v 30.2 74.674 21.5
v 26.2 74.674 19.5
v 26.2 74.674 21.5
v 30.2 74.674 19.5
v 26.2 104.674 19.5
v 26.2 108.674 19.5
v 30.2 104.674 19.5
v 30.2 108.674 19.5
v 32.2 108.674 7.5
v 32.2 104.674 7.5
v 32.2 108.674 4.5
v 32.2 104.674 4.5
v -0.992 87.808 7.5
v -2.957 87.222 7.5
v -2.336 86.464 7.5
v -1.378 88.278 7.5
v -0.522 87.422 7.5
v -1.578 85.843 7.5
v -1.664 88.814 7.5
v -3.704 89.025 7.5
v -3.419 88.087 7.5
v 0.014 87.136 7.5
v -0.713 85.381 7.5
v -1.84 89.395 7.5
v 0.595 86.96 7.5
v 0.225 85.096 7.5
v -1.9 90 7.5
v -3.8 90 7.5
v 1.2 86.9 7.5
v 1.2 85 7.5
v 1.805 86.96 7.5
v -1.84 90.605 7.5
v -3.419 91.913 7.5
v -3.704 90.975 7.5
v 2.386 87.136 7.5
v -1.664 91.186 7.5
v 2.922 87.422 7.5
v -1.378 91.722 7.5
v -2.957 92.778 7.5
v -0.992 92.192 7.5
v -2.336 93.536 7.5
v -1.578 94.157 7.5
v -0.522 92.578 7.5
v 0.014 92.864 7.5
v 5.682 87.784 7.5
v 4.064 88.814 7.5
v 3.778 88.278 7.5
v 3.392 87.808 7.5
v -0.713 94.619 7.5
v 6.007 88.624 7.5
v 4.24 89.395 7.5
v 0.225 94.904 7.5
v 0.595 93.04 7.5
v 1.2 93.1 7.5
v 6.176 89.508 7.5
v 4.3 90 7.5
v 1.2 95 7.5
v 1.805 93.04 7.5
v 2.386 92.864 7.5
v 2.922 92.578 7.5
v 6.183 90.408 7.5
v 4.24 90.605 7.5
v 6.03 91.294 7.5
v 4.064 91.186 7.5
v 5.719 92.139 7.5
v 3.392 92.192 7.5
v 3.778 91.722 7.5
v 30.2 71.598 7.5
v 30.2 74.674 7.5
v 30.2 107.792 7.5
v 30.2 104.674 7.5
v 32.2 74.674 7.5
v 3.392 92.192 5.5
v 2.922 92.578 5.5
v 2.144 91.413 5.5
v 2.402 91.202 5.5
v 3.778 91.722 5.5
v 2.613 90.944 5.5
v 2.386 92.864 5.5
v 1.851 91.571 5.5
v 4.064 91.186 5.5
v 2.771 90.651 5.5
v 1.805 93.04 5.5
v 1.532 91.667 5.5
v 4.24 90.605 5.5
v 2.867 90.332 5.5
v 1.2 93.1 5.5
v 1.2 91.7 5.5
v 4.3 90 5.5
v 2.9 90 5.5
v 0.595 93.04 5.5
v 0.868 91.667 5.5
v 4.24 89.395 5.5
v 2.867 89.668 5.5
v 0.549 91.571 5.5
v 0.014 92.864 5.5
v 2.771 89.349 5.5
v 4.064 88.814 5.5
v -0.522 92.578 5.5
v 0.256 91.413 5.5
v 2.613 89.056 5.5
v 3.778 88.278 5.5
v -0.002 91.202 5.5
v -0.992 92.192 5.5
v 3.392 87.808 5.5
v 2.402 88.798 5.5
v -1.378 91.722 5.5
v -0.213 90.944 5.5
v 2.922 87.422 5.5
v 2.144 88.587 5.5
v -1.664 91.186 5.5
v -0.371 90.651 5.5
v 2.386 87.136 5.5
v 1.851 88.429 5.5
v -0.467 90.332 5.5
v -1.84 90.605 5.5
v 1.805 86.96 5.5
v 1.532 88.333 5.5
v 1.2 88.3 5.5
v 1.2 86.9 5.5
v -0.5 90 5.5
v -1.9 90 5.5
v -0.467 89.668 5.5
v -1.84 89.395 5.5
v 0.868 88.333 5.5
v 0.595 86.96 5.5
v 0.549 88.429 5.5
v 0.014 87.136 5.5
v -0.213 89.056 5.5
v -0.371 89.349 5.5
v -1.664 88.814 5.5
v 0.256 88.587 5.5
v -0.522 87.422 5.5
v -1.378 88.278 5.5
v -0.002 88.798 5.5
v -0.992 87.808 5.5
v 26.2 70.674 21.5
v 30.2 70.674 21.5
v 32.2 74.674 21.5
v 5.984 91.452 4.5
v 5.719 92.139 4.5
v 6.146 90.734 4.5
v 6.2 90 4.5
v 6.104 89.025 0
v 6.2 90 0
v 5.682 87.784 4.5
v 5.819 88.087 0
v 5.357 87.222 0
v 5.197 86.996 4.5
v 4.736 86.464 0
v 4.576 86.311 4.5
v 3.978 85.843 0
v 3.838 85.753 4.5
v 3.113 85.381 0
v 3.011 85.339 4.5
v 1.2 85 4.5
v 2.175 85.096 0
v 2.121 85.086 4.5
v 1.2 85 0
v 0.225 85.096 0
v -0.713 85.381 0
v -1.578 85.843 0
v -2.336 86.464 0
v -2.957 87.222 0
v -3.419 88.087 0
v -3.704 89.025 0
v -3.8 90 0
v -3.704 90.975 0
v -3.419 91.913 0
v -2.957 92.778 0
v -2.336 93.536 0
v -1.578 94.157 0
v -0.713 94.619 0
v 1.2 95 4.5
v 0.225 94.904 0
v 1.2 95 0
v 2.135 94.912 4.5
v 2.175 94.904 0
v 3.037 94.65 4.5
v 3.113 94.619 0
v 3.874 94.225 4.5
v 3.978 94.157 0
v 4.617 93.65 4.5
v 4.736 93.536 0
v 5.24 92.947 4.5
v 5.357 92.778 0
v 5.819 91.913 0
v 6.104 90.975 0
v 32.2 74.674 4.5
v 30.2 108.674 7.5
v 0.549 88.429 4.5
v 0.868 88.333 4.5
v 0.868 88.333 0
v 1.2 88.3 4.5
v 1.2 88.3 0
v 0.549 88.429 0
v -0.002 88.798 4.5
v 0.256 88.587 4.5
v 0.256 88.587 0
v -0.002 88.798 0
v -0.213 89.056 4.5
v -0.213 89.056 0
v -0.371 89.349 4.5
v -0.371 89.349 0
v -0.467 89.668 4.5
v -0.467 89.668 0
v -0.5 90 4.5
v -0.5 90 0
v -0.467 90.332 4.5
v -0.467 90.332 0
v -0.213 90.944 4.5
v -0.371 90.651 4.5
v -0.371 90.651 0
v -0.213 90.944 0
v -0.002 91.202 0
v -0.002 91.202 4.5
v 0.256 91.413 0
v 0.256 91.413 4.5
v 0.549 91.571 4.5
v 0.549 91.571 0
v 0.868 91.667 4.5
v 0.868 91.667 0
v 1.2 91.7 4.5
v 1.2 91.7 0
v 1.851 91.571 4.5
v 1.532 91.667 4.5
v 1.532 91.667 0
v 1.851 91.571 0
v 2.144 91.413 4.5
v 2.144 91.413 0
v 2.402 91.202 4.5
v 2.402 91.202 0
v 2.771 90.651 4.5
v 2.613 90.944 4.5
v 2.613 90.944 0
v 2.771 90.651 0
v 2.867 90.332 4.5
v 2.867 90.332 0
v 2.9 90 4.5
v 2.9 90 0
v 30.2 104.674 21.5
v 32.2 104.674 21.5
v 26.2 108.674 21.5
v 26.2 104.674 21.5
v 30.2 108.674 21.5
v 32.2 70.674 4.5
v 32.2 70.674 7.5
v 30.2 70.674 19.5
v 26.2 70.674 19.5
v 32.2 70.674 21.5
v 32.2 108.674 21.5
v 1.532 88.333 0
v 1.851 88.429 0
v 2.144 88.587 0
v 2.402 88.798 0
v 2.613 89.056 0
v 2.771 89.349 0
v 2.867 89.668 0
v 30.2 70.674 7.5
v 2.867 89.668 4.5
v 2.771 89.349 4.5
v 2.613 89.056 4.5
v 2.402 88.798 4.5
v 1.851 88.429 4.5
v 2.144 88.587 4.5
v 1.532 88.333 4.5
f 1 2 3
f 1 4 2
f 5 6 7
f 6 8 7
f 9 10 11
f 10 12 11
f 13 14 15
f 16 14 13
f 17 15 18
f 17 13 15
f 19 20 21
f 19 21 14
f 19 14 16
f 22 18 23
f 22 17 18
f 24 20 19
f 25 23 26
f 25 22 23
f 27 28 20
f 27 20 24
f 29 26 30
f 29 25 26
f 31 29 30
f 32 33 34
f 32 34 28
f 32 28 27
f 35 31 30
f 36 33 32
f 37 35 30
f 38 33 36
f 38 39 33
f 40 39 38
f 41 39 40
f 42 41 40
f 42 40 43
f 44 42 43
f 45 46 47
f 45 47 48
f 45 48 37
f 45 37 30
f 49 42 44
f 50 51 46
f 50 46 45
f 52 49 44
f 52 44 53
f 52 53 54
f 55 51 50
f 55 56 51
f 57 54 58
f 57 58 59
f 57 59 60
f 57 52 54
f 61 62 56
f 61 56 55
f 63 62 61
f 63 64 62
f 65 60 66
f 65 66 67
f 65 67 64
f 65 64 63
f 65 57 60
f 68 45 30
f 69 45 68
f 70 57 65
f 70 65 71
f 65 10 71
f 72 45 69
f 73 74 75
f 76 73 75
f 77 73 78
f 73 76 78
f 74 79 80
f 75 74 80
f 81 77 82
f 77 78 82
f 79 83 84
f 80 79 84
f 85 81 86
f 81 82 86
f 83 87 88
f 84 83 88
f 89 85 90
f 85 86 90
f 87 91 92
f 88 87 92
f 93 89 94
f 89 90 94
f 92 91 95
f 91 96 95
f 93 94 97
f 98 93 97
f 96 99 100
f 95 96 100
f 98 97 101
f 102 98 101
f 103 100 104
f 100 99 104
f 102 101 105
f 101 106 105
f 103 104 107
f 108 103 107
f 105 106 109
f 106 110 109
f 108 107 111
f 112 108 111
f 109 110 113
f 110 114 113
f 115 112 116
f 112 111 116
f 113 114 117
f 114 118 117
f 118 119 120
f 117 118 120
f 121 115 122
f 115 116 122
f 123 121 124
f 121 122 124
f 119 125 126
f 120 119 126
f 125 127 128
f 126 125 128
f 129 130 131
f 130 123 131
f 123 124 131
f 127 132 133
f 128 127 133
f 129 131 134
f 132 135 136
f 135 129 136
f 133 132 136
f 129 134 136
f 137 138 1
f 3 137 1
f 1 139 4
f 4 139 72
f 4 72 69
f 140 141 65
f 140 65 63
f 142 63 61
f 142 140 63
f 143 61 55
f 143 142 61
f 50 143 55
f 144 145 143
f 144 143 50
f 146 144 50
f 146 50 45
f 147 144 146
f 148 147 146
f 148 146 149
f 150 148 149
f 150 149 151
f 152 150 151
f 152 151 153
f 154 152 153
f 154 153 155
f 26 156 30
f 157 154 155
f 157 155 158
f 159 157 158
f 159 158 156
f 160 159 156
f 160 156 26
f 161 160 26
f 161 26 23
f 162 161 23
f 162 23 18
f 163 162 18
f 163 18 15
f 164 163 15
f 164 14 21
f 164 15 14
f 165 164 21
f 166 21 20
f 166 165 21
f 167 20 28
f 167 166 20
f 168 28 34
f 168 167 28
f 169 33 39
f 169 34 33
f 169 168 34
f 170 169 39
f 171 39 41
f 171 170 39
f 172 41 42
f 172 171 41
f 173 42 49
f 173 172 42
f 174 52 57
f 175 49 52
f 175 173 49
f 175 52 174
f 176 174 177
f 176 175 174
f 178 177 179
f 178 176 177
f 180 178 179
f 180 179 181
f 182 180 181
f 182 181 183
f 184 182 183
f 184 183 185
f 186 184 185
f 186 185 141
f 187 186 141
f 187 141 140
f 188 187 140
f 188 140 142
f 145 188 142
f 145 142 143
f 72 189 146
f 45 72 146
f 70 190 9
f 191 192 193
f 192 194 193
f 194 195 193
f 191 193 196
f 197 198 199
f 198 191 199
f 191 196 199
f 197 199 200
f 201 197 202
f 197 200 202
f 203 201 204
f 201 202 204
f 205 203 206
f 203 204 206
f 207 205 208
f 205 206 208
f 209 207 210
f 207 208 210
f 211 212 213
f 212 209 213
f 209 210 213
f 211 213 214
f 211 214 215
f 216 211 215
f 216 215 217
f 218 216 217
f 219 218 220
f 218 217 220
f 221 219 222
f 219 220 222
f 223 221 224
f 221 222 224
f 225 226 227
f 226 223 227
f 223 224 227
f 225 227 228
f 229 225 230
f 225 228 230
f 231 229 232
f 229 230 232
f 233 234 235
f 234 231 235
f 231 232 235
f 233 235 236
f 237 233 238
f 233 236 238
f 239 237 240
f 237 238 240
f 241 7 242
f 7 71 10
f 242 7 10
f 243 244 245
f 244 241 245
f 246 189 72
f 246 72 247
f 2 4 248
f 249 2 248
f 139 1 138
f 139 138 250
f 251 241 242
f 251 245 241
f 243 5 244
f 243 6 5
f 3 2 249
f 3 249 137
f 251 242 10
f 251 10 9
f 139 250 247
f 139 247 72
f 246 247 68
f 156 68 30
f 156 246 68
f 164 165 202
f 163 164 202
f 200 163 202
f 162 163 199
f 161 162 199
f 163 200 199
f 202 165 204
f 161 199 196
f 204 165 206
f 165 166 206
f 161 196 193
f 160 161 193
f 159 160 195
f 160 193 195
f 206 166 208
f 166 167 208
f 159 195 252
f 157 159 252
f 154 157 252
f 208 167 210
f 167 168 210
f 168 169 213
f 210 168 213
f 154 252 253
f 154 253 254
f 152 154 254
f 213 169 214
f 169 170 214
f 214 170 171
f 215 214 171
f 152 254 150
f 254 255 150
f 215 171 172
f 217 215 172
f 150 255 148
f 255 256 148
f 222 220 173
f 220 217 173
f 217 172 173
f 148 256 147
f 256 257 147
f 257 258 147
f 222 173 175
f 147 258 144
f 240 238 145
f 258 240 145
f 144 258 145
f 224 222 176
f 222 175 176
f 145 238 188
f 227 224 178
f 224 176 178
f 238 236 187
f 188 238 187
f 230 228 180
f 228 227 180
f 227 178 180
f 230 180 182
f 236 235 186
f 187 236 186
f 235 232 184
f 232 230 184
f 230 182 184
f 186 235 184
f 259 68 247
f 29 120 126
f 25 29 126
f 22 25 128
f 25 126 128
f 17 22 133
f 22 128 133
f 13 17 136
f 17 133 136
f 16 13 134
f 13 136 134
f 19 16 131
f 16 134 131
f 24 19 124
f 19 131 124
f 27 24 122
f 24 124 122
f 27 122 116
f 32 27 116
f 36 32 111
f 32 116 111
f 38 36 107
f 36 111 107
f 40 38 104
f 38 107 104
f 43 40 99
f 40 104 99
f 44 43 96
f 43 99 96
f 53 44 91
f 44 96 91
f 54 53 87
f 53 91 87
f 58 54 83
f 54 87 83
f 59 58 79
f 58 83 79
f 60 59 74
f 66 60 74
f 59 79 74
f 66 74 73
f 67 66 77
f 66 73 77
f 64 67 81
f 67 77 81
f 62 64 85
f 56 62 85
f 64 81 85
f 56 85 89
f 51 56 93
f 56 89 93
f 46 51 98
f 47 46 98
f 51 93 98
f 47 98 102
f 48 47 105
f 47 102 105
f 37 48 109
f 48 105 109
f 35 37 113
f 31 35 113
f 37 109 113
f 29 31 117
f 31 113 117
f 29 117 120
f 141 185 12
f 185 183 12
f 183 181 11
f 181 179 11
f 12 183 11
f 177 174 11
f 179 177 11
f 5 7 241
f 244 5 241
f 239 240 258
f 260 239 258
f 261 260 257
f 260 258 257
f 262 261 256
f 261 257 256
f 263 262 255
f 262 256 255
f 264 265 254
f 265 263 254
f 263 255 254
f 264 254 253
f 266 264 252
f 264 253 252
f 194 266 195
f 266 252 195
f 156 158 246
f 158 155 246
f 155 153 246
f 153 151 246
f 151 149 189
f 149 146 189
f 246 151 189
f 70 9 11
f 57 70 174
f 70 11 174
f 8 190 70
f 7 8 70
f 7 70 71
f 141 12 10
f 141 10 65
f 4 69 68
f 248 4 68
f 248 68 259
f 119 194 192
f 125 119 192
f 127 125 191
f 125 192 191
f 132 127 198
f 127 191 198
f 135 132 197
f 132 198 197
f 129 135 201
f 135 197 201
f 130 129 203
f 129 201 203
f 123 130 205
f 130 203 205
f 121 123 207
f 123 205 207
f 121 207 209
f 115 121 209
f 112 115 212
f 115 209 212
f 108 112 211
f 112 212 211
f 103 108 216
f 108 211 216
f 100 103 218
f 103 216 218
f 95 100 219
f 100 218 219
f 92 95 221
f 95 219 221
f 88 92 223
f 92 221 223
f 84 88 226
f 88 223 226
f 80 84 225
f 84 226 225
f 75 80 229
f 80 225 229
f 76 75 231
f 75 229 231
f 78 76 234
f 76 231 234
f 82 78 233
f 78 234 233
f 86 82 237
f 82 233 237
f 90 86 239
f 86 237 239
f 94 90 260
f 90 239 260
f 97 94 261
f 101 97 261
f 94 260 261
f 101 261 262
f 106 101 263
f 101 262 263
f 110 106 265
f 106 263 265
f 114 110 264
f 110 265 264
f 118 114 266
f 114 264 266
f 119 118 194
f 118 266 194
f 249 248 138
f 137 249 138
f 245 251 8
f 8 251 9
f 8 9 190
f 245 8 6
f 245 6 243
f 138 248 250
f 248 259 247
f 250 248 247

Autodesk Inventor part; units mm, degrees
ref_plane "YZ Plane" through (0, 0, 0) normal (1, 0, 0) x (0, 1, 0)
ref_plane "XZ Plane" through (0, 0, 0) normal (0, 1, 0) x (-1, 0, 0)
ref_plane "XY Plane" through (0, 0, 0) normal (0, 0, 1) x (1, 0, 0)
sketch "Sketch1" plane through (0, 0, 0) normal (0, 0, 1) x (1, 0, 0)
  circle A0 centre (1.2, 90) radius 1.7 projected
  circle A1 centre (1.2, 90) radius 5
  point P0 (0, 0)
  dimension "d0" = 10
extrude "Extrusion1" add sketch "Sketch1" along normal blind 4.5
sketch "Sketch2" plane through (1.2, 90, 4.5) normal (0, 0, 1) x (1, 0, 0)
  circle A0 centre (0, 0) radius 1.7 projected
  line L0 (31, 14.6742) -> (31, -15.3258) construction
  circle A1 centre (0, 0) radius 5 projected
  line L1 (31, 14.6742) -> (31, 18.6742)
  line L2 (31, 18.6742) -> (0, 5)
  line L3 (31, -15.3258) -> (31, -19.3258)
  line L4 (31, -19.3258) -> (0, -5)
  line L5 (31, 14.6742) -> (4.5193, 2.1392)
  line L6 (31, -15.3258) -> (4.4822, -2.2159)
  arc A2 (0, 5) -> (0, -5) centre (0, 0) ccw
  arc A3 (4.4822, -2.2159) -> (4.5193, 2.1392) centre (0, 0) ccw
  point P0 (-1.2, -90)
  dimension "d3" = 31
  dimension "d4" = 30
  dimension "d5" = 4
  dimension "d6" = 4
extrude "Extrusion2" add sketch "Sketch2" along normal blind 3 contours A0 | A1 | A1 L2 L1 L5 | L6 L3 L4 A1
sketch "Sketch3" plane through (1.2, 90, 7.5) normal (0, 0, 1) x (1, 0, 0)
  circle A0 centre (0, 0) radius 1.7 projected
  point P0 (-1.2, -90)
hole "Hole1" at (1.2, 90, 7.5) direction (0, 0, -1) diameter 3.4 end through all counterbore diameter 6.2 counterbore depth 2
sketch "Sketch4" plane through (1.2, 90, 7.5) normal (0, 0, 1) x (1, 0, 0)
  line L0 (31, 18.6742) -> (0, 5) projected
  line L1 (31, 18.6742) -> (29, 18.6742)
  line L2 (29, 18.6742) -> (29, 14.6742)
  line L3 (29, 14.6742) -> (31, 14.6742)
  line L4 (31, 14.6742) -> (31, 18.6742)
  line L5 (31, -19.3258) -> (31, -15.3258) projected
  line L6 (31, -15.3258) -> (29, -15.3258)
  line L7 (29, -15.3258) -> (29, -19.3258)
  line L8 (29, -19.3258) -> (31, -19.3258)
  line L9 (31, -19.3258) -> (31, -15.3258)
  point P0 (-1.2, -90)
  dimension "d16" = 2
  dimension "d17" = 2
extrude "Extrusion3" add sketch "Sketch4" along normal blind 14
sketch "Sketch5" plane through (30.2, 107.792, 7.5) normal (-1, 0, 0) x (0, 0, 1)
  line L0 (0, 0.8822) -> (14, 0.8822) projected
  line L1 (0, -3.1178) -> (14, -3.1178) projected
  line L2 (14, 0.8822) -> (12, 0.8822)
  line L3 (12, 0.8822) -> (12, -3.1178)
  line L4 (12, -3.1178) -> (14, -3.1178)
  line L5 (14, -3.1178) -> (14, 0.8822)
  line L6 (0, -33.1178) -> (14, -33.1178) projected
  line L7 (0, -37.1178) -> (14, -37.1178) projected
  line L8 (14, -33.1178) -> (12, -33.1178)
  line L9 (12, -33.1178) -> (12, -37.1178)
  line L10 (12, -37.1178) -> (14, -37.1178)
  line L11 (14, -37.1178) -> (14, -33.1178)
  point P0 (-7.5, -107.792)
  dimension "d20" = 2
extrude "Extrusion4" add sketch "Sketch5" along normal blind 4
properties part number "microphone_fix"
